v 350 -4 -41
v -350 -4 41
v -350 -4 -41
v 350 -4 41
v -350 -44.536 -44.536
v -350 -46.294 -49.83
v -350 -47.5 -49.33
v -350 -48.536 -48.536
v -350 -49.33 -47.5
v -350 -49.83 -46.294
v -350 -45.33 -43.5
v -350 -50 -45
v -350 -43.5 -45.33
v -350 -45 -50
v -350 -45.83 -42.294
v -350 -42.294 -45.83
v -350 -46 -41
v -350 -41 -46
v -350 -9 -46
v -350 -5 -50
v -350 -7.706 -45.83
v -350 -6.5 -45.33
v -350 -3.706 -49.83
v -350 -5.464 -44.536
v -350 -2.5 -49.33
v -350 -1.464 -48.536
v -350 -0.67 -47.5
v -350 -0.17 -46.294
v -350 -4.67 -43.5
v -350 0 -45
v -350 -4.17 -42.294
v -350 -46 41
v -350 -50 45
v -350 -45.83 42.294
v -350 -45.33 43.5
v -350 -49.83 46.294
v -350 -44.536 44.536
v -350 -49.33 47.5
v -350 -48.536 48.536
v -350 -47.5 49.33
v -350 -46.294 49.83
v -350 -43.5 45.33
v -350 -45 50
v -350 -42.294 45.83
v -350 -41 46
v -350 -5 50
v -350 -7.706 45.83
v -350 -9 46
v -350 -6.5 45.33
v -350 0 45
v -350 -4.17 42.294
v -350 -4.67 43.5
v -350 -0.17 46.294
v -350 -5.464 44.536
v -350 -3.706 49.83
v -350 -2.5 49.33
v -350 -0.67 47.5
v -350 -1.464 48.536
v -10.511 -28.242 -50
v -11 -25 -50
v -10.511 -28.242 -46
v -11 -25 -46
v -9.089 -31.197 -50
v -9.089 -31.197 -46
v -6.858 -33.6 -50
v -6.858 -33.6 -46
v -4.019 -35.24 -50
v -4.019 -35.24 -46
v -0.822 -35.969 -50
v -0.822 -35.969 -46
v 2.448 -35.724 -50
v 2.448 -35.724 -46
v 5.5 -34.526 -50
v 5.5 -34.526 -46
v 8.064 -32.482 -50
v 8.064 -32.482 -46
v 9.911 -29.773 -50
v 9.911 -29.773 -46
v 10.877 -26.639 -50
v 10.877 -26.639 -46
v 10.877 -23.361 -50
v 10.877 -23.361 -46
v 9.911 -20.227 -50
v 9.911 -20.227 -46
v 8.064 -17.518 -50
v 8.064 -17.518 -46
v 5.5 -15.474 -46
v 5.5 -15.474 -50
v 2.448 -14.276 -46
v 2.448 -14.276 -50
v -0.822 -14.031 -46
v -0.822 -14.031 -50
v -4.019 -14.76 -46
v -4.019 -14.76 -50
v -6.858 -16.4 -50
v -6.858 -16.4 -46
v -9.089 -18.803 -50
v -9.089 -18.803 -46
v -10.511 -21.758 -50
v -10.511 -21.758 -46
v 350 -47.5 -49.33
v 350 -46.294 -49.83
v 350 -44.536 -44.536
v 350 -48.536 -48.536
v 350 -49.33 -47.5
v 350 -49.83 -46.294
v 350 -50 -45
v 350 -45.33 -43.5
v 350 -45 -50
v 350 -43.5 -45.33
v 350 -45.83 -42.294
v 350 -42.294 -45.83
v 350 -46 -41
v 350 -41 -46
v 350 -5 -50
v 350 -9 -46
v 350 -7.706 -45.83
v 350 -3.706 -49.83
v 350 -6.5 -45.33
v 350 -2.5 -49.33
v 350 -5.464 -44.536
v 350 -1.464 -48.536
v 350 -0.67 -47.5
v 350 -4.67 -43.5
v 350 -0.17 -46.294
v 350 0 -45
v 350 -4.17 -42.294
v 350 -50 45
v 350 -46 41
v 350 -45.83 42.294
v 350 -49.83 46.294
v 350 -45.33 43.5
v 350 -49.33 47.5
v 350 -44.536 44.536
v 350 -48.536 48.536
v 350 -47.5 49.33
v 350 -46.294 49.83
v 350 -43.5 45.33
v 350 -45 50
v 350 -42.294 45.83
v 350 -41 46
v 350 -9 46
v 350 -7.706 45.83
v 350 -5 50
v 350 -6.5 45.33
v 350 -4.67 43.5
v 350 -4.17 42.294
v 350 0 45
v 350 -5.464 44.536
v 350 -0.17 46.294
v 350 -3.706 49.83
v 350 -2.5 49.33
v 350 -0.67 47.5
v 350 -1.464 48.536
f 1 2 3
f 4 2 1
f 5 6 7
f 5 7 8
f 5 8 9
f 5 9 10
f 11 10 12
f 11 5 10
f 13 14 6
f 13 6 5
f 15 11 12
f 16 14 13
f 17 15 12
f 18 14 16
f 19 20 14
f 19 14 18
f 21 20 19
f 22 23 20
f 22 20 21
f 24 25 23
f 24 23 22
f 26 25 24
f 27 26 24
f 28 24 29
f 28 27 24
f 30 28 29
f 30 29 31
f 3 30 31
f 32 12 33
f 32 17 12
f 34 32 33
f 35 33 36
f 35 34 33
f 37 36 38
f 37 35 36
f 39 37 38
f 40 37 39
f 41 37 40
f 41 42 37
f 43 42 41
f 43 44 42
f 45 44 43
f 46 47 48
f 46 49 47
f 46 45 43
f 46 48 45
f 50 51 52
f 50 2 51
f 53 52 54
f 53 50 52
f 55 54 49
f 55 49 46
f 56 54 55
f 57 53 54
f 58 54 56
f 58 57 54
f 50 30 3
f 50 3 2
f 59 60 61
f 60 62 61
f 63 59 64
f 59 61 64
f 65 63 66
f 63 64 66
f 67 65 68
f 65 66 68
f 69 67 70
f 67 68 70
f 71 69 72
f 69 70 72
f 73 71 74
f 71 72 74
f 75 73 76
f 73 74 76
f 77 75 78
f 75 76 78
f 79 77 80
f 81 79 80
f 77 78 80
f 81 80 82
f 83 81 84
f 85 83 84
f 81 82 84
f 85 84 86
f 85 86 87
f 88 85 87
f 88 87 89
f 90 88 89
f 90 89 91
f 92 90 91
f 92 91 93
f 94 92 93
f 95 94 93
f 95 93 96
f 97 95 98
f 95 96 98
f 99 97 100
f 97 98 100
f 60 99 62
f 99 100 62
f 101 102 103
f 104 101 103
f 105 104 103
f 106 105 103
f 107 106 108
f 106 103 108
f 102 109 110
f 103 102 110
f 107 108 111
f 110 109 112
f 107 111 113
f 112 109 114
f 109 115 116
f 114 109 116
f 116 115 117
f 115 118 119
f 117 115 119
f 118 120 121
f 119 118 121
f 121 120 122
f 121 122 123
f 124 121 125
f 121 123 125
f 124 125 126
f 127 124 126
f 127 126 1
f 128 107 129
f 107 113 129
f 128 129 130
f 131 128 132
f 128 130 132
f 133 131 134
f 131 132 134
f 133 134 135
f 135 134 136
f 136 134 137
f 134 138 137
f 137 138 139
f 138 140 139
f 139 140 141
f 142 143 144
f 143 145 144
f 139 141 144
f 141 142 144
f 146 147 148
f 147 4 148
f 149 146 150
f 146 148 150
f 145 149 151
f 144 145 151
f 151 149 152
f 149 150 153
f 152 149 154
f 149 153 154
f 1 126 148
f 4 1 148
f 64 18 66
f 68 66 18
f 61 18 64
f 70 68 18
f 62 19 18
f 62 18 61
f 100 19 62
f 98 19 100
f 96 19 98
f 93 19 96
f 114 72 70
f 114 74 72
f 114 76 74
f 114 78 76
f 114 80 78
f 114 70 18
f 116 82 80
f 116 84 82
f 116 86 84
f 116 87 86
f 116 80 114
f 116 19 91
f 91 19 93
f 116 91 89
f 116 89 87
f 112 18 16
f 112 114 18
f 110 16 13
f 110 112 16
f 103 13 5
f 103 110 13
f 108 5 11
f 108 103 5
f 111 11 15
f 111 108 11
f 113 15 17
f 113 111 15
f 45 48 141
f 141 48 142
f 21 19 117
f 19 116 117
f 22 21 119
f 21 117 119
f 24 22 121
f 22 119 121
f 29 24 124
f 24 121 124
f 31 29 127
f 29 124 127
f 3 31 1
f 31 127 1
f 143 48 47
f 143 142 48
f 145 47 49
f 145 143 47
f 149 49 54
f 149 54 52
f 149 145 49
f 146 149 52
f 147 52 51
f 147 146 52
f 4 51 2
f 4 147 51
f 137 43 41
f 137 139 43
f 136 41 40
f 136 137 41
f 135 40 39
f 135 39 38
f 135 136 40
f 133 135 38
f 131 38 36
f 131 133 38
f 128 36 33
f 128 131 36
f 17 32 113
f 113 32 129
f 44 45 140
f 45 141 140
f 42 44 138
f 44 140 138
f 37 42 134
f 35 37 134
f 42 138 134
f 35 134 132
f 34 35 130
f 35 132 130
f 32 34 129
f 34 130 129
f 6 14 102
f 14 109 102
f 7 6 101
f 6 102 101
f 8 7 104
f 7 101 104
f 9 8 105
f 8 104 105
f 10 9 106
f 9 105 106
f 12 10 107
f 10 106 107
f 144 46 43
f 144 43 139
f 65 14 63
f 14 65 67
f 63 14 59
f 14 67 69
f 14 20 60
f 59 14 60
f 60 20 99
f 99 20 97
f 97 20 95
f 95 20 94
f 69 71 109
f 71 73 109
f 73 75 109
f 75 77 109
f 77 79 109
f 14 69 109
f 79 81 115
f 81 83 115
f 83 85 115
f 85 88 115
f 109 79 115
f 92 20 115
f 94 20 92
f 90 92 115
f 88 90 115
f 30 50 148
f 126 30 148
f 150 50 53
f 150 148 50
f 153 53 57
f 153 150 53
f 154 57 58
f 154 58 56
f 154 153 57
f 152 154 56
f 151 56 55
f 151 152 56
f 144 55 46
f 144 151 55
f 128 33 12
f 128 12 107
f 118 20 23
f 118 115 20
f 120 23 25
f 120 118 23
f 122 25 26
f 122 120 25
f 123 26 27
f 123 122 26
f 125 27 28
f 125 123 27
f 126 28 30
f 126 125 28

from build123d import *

# Parameters (mm, degrees)
F0_W     = 700
F0_H     = 100
F1_DEPTH = 50
F2_T     = -4
F3_R     = 5
F5_D     = 22
F5_DEPTH = 4
F5_TIP   = 6.6094668093


with BuildPart() as f1:
    # F0 (on Front) → F1 (new body)
    with BuildSketch(Plane.XZ):
        Rectangle(F0_W, F0_H)
    extrude(amount=F1_DEPTH)

    # F2
    f2_openings = [f1.faces().sort_by_distance(p)[0] for p in [
        (-350, -25, 0),
        (350, -25, 0),
    ]]
    offset(amount=F2_T, openings=f2_openings)

    # F3
    f3_edges = [f1.edges().sort_by_distance(p)[0] for p in [
        (0, -4, 46),
        (0, -46, 46),
        (0, 0, 50),
        (0, -50, 50),
        (0, -4, -46),
        (0, -50, -50),
        (0, -46, -46),
        (0, 0, -50),
    ]]
    fillet(f3_edges, radius=F3_R)

    # F5
    with Locations(Plane(origin=(0, 0, -50), x_dir=(1, 0, 0), z_dir=(0, 0, -1))):
        with Locations((0, 25)):
            Hole(F5_D / 2, depth=F5_DEPTH)
            with Locations((0, 0, -(F5_DEPTH + F5_TIP / 2))):  # 118° drill point
                Cone(0, F5_D / 2, F5_TIP, mode=Mode.SUBTRACT)


solid = f1.part
